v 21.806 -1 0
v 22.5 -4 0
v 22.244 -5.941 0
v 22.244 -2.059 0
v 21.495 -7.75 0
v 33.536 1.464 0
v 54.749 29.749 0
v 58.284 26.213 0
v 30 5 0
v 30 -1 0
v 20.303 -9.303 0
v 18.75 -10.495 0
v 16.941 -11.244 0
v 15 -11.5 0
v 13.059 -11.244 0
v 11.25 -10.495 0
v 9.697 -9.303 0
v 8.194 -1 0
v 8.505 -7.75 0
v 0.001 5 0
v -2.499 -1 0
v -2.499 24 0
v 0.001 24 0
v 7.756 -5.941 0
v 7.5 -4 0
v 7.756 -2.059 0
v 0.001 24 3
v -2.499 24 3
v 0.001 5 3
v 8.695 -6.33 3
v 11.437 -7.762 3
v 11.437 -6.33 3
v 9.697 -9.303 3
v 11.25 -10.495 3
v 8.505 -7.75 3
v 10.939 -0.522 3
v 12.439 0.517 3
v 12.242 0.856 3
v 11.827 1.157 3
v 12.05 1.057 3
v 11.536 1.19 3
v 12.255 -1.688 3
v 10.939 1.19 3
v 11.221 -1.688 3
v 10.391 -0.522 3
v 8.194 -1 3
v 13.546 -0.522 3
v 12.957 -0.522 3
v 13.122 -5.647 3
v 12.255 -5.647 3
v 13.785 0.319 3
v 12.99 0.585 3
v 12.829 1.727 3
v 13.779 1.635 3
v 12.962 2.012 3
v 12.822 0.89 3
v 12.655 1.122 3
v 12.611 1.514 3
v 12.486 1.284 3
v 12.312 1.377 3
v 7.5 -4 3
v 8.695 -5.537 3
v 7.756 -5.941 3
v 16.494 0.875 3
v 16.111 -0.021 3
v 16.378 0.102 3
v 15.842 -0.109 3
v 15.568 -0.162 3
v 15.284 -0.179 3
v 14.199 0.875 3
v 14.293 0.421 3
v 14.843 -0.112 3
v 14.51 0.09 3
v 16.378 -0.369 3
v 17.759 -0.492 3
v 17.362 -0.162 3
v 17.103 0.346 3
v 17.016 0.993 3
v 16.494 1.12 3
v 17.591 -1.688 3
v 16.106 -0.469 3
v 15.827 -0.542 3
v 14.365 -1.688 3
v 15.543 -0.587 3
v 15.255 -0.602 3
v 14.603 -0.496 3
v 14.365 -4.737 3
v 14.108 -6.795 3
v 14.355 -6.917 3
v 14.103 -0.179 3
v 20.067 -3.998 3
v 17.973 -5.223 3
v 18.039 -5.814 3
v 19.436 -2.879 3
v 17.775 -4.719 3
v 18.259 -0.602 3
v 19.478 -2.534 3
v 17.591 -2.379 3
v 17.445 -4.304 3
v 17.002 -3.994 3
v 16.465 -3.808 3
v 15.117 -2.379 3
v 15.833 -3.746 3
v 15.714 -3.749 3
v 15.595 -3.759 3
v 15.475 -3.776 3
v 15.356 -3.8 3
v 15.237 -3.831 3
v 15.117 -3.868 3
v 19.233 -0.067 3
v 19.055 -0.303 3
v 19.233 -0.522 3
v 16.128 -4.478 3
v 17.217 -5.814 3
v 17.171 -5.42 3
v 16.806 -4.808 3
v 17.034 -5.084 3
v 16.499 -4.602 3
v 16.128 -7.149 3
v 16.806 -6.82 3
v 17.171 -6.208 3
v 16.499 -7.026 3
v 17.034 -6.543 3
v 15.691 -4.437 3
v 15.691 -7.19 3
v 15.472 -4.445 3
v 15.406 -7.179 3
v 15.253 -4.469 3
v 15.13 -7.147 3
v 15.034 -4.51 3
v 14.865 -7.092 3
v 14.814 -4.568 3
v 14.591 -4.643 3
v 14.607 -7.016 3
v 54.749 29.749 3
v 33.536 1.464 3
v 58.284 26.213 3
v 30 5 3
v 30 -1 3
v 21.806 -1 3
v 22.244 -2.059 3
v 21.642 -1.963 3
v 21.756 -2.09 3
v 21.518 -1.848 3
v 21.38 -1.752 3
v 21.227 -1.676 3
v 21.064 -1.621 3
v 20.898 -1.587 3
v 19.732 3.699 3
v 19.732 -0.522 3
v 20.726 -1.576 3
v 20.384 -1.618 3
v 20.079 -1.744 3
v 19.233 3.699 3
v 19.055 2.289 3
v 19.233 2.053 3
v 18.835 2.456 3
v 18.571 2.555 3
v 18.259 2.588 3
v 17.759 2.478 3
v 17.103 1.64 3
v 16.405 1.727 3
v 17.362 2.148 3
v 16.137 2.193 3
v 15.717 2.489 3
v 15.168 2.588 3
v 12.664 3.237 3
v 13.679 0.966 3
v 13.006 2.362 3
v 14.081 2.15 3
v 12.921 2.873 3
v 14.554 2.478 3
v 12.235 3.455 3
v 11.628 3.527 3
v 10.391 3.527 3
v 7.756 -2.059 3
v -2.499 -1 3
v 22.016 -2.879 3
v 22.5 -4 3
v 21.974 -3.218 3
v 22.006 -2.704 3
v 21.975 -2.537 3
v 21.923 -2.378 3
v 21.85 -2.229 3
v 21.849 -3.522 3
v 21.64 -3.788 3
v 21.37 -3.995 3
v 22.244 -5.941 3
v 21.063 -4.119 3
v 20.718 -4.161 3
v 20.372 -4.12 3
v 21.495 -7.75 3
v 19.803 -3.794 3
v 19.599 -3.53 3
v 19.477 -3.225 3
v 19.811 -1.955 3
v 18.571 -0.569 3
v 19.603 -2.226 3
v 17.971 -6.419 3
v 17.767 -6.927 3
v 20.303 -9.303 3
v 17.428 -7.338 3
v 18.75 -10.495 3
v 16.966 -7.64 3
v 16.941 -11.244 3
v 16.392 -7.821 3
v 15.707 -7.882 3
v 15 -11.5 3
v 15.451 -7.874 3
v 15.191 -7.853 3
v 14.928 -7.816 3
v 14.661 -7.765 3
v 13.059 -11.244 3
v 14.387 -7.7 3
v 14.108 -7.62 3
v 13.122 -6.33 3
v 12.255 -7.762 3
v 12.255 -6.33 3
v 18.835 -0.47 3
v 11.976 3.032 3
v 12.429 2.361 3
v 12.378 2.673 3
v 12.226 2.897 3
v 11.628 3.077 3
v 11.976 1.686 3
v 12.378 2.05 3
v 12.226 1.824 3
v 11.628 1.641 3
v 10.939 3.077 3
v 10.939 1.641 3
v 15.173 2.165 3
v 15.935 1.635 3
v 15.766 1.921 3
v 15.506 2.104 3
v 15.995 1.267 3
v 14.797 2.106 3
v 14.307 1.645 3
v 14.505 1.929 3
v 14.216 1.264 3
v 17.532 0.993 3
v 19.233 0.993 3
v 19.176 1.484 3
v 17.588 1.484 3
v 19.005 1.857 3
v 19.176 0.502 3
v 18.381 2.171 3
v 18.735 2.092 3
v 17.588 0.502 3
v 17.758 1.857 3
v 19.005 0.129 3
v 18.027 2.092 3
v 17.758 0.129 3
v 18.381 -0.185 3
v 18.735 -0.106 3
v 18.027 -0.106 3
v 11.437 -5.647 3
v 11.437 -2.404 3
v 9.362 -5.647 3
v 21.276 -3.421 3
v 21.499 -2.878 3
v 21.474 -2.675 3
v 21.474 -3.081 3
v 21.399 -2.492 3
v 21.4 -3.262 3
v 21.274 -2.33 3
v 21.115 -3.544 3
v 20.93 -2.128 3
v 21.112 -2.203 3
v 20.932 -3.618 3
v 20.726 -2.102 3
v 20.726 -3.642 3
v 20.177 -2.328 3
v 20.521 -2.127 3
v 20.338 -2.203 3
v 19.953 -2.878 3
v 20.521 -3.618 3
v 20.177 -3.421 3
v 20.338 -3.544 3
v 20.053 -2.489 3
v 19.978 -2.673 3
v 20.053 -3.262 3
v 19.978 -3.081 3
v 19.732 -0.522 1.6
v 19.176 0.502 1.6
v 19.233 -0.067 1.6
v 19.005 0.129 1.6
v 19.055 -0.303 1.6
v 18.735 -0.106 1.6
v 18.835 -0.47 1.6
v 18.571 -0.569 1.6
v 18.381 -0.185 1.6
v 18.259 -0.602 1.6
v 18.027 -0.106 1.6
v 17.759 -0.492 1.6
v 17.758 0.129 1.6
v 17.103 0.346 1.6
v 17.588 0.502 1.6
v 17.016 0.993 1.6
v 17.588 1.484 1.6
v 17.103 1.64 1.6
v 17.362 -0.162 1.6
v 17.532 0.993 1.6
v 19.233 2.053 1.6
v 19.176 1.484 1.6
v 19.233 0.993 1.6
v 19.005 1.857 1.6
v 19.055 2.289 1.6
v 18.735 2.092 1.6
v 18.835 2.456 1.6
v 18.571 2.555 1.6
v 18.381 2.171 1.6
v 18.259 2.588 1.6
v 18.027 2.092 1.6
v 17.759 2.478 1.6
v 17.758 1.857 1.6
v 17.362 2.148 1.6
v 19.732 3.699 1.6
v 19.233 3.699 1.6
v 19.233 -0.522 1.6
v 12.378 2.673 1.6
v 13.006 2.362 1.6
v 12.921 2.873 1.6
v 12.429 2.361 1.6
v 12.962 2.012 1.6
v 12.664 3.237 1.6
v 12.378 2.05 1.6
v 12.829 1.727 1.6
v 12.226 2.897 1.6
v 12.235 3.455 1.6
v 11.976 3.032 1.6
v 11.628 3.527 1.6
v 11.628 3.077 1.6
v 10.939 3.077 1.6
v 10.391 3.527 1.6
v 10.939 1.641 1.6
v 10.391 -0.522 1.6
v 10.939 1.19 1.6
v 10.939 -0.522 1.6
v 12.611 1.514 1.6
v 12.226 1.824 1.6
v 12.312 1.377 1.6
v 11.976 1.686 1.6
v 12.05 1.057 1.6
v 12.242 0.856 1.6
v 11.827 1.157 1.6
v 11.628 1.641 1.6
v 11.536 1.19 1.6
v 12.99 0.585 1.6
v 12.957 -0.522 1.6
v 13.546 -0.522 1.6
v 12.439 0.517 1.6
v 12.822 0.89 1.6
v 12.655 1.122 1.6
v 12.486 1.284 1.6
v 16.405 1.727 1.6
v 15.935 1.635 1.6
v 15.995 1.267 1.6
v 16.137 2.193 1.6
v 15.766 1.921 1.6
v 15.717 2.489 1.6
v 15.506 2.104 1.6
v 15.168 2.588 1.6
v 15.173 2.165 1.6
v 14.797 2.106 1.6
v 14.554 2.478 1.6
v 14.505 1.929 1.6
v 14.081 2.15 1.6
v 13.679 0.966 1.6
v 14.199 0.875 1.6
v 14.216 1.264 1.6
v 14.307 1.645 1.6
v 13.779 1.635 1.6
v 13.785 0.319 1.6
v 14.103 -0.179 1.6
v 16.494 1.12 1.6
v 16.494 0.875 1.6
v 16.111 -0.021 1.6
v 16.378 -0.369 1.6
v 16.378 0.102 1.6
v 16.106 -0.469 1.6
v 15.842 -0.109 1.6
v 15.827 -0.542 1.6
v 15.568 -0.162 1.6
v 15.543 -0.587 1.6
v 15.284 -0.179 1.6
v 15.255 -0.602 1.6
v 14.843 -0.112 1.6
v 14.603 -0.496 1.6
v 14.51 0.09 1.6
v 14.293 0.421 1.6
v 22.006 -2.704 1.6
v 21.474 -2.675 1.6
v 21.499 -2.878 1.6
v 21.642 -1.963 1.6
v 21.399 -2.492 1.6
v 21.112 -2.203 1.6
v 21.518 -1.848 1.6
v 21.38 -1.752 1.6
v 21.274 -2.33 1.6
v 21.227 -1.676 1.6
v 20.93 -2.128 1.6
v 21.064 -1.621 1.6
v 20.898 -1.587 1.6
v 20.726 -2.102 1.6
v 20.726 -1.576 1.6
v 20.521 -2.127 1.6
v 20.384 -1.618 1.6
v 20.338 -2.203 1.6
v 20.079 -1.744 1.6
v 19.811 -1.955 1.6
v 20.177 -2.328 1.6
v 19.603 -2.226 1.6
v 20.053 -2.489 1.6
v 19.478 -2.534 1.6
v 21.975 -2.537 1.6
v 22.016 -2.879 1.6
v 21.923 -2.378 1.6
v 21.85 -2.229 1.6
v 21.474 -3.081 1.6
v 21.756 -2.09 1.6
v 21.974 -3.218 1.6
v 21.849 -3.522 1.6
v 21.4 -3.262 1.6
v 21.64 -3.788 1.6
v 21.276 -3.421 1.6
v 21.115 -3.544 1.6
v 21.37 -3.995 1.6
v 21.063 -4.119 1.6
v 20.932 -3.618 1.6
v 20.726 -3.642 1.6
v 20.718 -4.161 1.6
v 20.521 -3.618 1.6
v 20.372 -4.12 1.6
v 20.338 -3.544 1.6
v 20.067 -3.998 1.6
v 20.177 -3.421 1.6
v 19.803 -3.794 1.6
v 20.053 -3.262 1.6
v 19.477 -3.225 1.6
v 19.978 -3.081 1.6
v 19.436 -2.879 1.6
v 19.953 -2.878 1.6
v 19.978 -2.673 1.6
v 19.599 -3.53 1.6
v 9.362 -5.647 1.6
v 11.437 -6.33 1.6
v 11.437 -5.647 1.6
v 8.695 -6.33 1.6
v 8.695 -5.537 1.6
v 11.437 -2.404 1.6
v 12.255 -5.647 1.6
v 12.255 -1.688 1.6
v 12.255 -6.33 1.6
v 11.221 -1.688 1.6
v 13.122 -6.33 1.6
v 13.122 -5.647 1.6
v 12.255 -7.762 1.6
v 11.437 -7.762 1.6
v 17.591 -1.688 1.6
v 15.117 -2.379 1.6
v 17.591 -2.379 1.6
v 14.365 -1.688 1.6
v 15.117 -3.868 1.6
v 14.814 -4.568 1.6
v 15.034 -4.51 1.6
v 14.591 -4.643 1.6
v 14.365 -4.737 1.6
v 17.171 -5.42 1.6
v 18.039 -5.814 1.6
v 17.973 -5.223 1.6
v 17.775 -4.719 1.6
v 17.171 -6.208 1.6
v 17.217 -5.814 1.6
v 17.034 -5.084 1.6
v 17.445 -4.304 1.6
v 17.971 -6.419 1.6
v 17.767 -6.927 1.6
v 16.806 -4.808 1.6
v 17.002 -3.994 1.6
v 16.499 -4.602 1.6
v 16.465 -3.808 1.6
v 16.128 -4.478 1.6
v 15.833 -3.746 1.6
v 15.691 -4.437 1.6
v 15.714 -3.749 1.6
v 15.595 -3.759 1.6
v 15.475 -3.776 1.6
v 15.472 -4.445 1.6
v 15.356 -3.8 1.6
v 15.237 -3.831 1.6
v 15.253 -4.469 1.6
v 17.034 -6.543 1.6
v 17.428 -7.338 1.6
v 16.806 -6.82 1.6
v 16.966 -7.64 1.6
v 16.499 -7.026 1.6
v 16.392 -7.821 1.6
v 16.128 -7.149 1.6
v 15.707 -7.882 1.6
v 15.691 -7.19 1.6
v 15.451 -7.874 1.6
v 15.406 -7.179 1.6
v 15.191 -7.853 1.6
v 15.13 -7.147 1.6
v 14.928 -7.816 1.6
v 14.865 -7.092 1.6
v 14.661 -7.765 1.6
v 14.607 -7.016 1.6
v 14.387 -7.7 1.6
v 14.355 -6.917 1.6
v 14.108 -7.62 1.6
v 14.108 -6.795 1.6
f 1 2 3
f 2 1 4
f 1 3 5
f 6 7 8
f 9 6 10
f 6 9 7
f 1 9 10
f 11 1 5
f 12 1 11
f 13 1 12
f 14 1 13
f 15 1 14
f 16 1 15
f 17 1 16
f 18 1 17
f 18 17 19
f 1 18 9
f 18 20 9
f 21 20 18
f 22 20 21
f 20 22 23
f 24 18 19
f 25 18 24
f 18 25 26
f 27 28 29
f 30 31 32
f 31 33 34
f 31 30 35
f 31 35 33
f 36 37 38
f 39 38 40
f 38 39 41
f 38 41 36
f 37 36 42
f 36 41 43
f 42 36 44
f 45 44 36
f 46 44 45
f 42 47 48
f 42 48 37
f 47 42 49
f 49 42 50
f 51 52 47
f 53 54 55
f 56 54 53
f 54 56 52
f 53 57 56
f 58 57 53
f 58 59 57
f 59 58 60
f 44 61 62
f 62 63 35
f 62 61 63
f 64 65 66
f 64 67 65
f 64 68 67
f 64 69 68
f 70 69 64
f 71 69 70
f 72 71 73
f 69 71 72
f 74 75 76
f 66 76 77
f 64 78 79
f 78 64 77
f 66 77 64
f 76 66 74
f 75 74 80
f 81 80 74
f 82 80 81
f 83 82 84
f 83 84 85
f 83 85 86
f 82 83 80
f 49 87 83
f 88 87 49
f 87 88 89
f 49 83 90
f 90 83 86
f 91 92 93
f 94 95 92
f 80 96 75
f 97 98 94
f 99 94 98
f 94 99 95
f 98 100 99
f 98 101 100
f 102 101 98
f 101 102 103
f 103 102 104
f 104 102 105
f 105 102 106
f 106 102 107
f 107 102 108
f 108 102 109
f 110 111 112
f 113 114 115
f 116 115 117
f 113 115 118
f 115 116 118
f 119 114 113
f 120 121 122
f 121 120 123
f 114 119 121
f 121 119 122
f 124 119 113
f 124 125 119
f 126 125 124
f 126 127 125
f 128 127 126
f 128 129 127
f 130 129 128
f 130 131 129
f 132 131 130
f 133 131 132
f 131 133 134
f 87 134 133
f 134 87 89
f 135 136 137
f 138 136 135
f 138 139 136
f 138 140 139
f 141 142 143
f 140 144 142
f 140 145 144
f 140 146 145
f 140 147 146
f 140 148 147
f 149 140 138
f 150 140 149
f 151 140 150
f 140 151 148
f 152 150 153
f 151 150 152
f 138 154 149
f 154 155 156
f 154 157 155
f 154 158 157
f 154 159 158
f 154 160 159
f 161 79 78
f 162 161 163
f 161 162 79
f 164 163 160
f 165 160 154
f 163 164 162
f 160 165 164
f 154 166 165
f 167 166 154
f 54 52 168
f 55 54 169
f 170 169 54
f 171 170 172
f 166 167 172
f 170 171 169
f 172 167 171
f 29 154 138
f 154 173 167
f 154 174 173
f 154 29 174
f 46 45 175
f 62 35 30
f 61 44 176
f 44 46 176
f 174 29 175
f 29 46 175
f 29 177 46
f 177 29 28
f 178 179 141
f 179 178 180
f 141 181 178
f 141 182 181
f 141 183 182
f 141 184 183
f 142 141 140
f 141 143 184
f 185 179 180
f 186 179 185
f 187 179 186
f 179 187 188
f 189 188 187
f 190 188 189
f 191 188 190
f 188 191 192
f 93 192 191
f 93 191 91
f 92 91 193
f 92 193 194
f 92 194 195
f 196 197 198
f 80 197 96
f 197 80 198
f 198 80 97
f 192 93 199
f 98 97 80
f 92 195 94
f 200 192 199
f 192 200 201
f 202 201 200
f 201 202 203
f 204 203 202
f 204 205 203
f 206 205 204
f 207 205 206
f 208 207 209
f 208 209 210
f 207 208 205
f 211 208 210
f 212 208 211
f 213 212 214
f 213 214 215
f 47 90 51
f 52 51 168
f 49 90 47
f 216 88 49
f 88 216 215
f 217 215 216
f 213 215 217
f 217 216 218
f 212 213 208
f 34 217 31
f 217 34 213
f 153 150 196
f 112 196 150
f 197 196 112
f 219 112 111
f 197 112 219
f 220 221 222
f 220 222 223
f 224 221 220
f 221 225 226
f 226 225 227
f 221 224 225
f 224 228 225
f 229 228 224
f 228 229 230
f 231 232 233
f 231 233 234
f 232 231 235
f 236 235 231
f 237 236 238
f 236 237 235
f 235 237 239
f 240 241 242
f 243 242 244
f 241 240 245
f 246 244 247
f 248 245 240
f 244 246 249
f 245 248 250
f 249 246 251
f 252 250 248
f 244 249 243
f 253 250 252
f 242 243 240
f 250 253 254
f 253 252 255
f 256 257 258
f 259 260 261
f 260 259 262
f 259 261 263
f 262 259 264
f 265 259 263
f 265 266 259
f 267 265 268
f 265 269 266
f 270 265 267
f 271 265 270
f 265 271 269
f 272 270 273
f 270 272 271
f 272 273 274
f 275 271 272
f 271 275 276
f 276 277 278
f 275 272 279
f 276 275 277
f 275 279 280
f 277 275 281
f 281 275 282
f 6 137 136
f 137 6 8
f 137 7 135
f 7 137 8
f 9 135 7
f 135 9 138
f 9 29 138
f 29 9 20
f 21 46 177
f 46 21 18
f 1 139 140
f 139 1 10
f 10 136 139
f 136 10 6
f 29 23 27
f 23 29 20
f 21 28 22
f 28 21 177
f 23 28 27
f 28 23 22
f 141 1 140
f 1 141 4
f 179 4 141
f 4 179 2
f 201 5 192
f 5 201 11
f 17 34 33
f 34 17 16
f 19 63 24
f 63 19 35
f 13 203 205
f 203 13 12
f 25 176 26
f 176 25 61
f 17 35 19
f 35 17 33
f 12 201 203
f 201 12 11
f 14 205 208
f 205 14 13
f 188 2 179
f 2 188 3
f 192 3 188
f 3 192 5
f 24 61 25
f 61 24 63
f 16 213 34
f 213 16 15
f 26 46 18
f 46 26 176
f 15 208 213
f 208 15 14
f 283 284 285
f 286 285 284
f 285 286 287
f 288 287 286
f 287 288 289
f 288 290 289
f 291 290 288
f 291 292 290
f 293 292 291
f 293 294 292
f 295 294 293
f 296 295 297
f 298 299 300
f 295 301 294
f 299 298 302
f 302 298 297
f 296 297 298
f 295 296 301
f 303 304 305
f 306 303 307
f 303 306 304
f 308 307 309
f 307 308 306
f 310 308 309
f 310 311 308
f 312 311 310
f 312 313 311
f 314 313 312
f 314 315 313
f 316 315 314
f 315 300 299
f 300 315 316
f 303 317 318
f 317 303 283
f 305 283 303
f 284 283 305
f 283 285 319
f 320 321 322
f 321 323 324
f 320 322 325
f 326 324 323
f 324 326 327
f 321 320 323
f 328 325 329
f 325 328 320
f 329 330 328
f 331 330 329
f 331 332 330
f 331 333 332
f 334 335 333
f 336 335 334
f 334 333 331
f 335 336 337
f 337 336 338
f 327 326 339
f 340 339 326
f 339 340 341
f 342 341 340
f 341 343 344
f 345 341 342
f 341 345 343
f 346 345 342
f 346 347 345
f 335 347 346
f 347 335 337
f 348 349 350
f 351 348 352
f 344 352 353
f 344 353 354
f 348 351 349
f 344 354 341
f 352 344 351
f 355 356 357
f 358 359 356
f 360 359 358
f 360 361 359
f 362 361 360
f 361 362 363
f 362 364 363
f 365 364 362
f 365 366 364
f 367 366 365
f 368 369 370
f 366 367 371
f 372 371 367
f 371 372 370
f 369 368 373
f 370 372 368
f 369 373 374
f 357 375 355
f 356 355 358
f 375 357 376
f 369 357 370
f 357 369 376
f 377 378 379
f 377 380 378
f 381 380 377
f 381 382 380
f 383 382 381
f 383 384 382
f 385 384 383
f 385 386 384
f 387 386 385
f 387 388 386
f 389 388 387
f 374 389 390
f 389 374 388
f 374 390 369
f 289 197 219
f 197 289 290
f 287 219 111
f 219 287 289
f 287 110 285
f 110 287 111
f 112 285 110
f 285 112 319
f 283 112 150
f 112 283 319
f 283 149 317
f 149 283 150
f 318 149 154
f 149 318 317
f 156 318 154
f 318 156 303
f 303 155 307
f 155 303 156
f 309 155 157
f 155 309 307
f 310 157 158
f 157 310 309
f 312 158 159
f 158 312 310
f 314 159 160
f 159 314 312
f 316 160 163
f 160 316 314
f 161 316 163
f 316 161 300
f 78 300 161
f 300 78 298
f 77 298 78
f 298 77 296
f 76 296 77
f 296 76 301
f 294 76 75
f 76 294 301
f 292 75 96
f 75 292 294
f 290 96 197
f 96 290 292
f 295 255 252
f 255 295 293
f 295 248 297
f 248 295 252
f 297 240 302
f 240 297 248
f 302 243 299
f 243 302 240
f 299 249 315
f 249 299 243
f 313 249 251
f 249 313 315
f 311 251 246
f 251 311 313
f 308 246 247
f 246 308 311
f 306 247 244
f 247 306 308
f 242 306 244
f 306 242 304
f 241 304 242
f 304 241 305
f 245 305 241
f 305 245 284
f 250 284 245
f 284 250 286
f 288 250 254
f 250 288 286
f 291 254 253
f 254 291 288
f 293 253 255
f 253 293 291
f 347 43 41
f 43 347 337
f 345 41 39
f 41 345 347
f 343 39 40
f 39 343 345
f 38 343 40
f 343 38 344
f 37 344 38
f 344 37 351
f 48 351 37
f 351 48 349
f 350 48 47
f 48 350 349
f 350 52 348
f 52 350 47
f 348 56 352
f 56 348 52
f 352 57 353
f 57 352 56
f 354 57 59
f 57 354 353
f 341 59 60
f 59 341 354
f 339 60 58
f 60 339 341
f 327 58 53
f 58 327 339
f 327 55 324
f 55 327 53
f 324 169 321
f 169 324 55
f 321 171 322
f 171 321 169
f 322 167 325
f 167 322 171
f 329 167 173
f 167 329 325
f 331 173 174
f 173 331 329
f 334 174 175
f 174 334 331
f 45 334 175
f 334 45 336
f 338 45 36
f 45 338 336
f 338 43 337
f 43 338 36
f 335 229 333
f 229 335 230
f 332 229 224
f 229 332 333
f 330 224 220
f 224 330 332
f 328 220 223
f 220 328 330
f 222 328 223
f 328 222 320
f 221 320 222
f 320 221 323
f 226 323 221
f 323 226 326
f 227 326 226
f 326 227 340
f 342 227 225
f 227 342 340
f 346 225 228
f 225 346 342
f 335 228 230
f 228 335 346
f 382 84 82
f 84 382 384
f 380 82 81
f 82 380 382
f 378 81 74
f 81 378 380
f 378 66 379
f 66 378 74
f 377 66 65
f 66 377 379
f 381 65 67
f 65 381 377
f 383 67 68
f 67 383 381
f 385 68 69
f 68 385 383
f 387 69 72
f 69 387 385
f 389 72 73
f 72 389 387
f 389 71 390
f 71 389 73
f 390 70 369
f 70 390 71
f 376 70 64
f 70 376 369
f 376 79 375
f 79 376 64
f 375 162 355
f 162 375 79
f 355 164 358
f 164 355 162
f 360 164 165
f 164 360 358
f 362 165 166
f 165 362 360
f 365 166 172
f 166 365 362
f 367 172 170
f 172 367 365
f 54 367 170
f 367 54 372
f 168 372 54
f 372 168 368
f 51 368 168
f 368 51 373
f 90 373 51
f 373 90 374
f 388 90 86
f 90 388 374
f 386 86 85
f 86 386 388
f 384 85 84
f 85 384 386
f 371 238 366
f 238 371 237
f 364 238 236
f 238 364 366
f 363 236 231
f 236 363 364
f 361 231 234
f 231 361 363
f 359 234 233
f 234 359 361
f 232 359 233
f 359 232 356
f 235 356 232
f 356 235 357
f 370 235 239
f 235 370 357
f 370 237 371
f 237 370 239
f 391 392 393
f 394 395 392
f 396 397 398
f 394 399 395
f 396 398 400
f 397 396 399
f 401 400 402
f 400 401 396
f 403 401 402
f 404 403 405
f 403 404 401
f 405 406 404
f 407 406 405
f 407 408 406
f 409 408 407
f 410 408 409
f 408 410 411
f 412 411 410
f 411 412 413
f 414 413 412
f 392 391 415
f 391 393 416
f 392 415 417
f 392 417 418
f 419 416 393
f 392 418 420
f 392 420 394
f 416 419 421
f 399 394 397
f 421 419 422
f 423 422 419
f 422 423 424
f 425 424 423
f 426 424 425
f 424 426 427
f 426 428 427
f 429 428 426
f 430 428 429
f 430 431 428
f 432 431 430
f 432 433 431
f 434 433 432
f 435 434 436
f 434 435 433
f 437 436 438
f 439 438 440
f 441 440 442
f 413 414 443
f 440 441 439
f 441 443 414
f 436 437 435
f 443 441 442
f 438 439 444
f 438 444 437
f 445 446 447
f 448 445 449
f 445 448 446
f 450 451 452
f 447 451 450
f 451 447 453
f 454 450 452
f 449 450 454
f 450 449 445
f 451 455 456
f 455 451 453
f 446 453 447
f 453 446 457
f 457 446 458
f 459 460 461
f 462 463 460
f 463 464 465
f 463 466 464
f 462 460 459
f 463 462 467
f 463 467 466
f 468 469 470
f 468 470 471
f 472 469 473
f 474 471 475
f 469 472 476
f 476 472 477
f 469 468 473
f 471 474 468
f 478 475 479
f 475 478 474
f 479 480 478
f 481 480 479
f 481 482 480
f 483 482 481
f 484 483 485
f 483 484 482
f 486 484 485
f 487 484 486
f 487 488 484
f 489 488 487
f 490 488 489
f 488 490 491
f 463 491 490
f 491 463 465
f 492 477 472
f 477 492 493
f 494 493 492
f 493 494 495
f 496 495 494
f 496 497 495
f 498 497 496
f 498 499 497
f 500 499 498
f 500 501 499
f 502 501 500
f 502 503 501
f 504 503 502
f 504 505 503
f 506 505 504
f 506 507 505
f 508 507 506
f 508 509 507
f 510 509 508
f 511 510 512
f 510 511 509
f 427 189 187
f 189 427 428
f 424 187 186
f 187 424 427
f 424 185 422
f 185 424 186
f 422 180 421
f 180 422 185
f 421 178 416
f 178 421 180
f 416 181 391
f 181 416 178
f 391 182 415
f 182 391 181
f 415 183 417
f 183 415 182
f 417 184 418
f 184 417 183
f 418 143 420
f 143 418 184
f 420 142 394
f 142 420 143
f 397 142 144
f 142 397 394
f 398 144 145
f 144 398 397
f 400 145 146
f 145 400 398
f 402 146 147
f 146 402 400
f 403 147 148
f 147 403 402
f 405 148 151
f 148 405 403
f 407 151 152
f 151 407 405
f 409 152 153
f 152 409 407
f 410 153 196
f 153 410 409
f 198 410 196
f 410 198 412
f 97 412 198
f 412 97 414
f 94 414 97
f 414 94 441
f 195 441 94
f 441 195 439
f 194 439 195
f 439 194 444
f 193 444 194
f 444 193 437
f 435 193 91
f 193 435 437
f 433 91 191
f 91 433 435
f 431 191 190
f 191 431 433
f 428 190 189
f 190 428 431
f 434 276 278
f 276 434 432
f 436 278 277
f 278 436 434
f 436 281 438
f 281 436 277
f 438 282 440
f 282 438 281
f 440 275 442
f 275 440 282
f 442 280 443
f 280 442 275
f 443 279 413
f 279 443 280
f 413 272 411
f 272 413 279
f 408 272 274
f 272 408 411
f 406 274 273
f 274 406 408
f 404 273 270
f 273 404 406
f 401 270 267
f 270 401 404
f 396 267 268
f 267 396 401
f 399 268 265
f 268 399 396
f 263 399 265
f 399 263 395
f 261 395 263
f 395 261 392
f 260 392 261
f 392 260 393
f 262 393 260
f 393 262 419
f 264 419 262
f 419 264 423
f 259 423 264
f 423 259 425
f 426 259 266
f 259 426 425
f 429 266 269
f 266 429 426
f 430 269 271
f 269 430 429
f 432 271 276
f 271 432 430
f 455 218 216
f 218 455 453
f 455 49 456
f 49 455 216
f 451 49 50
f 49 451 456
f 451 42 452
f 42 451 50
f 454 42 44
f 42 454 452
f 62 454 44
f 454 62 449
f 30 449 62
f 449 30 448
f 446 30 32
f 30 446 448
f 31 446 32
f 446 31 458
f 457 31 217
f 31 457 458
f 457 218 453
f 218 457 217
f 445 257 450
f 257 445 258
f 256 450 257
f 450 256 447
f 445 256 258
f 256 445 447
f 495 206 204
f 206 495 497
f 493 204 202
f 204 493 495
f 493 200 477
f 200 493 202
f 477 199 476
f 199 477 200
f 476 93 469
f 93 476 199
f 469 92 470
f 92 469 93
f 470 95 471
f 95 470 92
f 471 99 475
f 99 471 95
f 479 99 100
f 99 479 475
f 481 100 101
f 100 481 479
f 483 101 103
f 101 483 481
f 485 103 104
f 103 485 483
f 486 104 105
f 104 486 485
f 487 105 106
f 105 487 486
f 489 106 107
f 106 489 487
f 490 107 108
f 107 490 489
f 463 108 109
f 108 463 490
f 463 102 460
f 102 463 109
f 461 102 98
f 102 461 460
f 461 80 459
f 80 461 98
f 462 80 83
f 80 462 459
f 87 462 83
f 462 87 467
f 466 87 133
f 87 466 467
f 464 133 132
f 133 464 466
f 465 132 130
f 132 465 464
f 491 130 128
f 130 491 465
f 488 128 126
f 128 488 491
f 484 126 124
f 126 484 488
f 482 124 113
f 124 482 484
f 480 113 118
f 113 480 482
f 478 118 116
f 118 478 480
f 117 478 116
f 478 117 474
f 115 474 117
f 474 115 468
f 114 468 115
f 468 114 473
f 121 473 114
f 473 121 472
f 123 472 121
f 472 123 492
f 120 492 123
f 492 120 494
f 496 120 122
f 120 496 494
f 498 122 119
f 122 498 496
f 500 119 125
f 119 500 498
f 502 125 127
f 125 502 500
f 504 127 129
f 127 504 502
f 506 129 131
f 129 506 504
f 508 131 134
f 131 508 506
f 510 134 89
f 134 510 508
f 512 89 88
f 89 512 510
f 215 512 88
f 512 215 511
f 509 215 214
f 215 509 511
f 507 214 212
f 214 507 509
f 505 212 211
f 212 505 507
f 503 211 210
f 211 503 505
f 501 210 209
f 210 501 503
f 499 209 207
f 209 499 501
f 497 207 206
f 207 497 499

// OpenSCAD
// Armada 45 degree turn template

turnAngle = 45.00 ;

baseWidth=30.00 ; height=3.00 ;
armLength = 35.00;
baseDepth = 5.00 ;

points = [[0,baseDepth],[baseWidth,baseDepth]
         ,[baseWidth+armLength*sin(turnAngle), baseDepth+armLength*cos(turnAngle)]
         ,[baseWidth+armLength*sin(turnAngle)+baseDepth*cos(turnAngle), baseDepth+armLength*cos(turnAngle) - baseDepth*sin(turnAngle) ]
         ,[baseWidth+baseDepth*cos(turnAngle), baseDepth - baseDepth*sin(turnAngle) ]
         ,[baseWidth,-1.00], [0,-1.00]
] ;

difference() {
union() {
linear_extrude(height=height) polygon(points);
//translate([baseWidth,0,0])mirror([1,0,0])linear_extrude(height=height) polygon(points);

translate([-2.499,-1,0])cube([2.5,25.0,height]) ;

translate([baseWidth/2,-4,0]) color("orange") cylinder(r=7.5,h=height) ;
}
translate([baseWidth/2,baseDepth/2-1,1.6])
linear_extrude(height=2.0)
   text("Red", font="Arial Rounded MT Bold:style=Regular",size=4, valign="center", halign="center");

translate([baseWidth/2+.5,-4.8,1.6])
linear_extrude(height=1.5)
   text("45°", size=6, font="Arial Rounded MT Bold:style=Regular", valign="center", halign="center");
}


/*
difference() {
    union() {
translate([baseWidth/2,-4,0]) color("orange") cylinder(r=7.5,h=height) ;

translate([-0.2,1.7,0])color("blue")rotate([0,0,45])translate([-2.5,0,0])cube([5,armLength,height]) ;

translate([-2.0,0,0])color("gray")cube([baseWidth+4.1,5,height]) ;

translate([baseWidth-2.55,1.75,0])
    mirror([1,0,0])
        translate([-2.9,0,0])color("pink")rotate([0,0,45])translate([-2.5,0,0])cube([5,armLength,height]) ;

}

translate([baseWidth/2,2.5,1.6])
linear_extrude(height=1.5)
   text("Red", font="Arial Nova:style=Bold",size=3, valign="center", halign="center");

translate([baseWidth/2+.5,-4.8,1.6])
linear_extrude(height=1.5)
   text("45°", size=6, font="Arial Nova:style=Bold", valign="center", halign="center");
}
//check base gap!
//translate([0,5.2,0]) cube([baseWidth,2,3]) ;
*/
